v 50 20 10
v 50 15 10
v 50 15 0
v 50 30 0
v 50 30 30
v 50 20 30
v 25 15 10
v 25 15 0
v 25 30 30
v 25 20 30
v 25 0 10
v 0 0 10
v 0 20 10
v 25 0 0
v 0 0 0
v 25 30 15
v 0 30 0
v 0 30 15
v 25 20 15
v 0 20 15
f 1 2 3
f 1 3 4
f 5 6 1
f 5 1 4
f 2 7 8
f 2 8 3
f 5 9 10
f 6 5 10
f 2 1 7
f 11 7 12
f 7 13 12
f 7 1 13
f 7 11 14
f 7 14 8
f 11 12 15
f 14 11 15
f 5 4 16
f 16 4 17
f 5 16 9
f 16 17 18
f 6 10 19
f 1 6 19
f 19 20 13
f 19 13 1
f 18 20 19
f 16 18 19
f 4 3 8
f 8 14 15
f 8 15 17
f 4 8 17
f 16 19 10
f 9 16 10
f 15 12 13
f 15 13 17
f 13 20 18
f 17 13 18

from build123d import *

# Parameters (mm, degrees)
F1_DEPTH = 50
F2_W     = 25
F2_H     = 15
F3_DEPTH = 10.001
F4_W     = 25
F4_H     = 15
F5_DEPTH = 10.001


with BuildPart() as f1:
    # F0 (on Right) → F1 (new body)
    with BuildSketch(Plane.YZ):
        Polygon((0, 10), (0, 0), (30, 0), (30, 30), (20, 30), (20, 10), align=None)
    extrude(amount=F1_DEPTH)

    # F2 (on face) → F3 (cut, through all)
    with BuildSketch(Plane.XZ.offset(-20)):
        with Locations((12.5, 22.5)):
            Rectangle(F2_W, F2_H)
    extrude(amount=-F3_DEPTH, mode=Mode.SUBTRACT)

    # F4 (on face) → F5 (cut, through all)
    with BuildSketch(Plane.XY.offset(10)):
        with Locations((37.5, 7.5)):
            Rectangle(F4_W, F4_H)
    extrude(amount=-F5_DEPTH, mode=Mode.SUBTRACT)


solid = f1.part
